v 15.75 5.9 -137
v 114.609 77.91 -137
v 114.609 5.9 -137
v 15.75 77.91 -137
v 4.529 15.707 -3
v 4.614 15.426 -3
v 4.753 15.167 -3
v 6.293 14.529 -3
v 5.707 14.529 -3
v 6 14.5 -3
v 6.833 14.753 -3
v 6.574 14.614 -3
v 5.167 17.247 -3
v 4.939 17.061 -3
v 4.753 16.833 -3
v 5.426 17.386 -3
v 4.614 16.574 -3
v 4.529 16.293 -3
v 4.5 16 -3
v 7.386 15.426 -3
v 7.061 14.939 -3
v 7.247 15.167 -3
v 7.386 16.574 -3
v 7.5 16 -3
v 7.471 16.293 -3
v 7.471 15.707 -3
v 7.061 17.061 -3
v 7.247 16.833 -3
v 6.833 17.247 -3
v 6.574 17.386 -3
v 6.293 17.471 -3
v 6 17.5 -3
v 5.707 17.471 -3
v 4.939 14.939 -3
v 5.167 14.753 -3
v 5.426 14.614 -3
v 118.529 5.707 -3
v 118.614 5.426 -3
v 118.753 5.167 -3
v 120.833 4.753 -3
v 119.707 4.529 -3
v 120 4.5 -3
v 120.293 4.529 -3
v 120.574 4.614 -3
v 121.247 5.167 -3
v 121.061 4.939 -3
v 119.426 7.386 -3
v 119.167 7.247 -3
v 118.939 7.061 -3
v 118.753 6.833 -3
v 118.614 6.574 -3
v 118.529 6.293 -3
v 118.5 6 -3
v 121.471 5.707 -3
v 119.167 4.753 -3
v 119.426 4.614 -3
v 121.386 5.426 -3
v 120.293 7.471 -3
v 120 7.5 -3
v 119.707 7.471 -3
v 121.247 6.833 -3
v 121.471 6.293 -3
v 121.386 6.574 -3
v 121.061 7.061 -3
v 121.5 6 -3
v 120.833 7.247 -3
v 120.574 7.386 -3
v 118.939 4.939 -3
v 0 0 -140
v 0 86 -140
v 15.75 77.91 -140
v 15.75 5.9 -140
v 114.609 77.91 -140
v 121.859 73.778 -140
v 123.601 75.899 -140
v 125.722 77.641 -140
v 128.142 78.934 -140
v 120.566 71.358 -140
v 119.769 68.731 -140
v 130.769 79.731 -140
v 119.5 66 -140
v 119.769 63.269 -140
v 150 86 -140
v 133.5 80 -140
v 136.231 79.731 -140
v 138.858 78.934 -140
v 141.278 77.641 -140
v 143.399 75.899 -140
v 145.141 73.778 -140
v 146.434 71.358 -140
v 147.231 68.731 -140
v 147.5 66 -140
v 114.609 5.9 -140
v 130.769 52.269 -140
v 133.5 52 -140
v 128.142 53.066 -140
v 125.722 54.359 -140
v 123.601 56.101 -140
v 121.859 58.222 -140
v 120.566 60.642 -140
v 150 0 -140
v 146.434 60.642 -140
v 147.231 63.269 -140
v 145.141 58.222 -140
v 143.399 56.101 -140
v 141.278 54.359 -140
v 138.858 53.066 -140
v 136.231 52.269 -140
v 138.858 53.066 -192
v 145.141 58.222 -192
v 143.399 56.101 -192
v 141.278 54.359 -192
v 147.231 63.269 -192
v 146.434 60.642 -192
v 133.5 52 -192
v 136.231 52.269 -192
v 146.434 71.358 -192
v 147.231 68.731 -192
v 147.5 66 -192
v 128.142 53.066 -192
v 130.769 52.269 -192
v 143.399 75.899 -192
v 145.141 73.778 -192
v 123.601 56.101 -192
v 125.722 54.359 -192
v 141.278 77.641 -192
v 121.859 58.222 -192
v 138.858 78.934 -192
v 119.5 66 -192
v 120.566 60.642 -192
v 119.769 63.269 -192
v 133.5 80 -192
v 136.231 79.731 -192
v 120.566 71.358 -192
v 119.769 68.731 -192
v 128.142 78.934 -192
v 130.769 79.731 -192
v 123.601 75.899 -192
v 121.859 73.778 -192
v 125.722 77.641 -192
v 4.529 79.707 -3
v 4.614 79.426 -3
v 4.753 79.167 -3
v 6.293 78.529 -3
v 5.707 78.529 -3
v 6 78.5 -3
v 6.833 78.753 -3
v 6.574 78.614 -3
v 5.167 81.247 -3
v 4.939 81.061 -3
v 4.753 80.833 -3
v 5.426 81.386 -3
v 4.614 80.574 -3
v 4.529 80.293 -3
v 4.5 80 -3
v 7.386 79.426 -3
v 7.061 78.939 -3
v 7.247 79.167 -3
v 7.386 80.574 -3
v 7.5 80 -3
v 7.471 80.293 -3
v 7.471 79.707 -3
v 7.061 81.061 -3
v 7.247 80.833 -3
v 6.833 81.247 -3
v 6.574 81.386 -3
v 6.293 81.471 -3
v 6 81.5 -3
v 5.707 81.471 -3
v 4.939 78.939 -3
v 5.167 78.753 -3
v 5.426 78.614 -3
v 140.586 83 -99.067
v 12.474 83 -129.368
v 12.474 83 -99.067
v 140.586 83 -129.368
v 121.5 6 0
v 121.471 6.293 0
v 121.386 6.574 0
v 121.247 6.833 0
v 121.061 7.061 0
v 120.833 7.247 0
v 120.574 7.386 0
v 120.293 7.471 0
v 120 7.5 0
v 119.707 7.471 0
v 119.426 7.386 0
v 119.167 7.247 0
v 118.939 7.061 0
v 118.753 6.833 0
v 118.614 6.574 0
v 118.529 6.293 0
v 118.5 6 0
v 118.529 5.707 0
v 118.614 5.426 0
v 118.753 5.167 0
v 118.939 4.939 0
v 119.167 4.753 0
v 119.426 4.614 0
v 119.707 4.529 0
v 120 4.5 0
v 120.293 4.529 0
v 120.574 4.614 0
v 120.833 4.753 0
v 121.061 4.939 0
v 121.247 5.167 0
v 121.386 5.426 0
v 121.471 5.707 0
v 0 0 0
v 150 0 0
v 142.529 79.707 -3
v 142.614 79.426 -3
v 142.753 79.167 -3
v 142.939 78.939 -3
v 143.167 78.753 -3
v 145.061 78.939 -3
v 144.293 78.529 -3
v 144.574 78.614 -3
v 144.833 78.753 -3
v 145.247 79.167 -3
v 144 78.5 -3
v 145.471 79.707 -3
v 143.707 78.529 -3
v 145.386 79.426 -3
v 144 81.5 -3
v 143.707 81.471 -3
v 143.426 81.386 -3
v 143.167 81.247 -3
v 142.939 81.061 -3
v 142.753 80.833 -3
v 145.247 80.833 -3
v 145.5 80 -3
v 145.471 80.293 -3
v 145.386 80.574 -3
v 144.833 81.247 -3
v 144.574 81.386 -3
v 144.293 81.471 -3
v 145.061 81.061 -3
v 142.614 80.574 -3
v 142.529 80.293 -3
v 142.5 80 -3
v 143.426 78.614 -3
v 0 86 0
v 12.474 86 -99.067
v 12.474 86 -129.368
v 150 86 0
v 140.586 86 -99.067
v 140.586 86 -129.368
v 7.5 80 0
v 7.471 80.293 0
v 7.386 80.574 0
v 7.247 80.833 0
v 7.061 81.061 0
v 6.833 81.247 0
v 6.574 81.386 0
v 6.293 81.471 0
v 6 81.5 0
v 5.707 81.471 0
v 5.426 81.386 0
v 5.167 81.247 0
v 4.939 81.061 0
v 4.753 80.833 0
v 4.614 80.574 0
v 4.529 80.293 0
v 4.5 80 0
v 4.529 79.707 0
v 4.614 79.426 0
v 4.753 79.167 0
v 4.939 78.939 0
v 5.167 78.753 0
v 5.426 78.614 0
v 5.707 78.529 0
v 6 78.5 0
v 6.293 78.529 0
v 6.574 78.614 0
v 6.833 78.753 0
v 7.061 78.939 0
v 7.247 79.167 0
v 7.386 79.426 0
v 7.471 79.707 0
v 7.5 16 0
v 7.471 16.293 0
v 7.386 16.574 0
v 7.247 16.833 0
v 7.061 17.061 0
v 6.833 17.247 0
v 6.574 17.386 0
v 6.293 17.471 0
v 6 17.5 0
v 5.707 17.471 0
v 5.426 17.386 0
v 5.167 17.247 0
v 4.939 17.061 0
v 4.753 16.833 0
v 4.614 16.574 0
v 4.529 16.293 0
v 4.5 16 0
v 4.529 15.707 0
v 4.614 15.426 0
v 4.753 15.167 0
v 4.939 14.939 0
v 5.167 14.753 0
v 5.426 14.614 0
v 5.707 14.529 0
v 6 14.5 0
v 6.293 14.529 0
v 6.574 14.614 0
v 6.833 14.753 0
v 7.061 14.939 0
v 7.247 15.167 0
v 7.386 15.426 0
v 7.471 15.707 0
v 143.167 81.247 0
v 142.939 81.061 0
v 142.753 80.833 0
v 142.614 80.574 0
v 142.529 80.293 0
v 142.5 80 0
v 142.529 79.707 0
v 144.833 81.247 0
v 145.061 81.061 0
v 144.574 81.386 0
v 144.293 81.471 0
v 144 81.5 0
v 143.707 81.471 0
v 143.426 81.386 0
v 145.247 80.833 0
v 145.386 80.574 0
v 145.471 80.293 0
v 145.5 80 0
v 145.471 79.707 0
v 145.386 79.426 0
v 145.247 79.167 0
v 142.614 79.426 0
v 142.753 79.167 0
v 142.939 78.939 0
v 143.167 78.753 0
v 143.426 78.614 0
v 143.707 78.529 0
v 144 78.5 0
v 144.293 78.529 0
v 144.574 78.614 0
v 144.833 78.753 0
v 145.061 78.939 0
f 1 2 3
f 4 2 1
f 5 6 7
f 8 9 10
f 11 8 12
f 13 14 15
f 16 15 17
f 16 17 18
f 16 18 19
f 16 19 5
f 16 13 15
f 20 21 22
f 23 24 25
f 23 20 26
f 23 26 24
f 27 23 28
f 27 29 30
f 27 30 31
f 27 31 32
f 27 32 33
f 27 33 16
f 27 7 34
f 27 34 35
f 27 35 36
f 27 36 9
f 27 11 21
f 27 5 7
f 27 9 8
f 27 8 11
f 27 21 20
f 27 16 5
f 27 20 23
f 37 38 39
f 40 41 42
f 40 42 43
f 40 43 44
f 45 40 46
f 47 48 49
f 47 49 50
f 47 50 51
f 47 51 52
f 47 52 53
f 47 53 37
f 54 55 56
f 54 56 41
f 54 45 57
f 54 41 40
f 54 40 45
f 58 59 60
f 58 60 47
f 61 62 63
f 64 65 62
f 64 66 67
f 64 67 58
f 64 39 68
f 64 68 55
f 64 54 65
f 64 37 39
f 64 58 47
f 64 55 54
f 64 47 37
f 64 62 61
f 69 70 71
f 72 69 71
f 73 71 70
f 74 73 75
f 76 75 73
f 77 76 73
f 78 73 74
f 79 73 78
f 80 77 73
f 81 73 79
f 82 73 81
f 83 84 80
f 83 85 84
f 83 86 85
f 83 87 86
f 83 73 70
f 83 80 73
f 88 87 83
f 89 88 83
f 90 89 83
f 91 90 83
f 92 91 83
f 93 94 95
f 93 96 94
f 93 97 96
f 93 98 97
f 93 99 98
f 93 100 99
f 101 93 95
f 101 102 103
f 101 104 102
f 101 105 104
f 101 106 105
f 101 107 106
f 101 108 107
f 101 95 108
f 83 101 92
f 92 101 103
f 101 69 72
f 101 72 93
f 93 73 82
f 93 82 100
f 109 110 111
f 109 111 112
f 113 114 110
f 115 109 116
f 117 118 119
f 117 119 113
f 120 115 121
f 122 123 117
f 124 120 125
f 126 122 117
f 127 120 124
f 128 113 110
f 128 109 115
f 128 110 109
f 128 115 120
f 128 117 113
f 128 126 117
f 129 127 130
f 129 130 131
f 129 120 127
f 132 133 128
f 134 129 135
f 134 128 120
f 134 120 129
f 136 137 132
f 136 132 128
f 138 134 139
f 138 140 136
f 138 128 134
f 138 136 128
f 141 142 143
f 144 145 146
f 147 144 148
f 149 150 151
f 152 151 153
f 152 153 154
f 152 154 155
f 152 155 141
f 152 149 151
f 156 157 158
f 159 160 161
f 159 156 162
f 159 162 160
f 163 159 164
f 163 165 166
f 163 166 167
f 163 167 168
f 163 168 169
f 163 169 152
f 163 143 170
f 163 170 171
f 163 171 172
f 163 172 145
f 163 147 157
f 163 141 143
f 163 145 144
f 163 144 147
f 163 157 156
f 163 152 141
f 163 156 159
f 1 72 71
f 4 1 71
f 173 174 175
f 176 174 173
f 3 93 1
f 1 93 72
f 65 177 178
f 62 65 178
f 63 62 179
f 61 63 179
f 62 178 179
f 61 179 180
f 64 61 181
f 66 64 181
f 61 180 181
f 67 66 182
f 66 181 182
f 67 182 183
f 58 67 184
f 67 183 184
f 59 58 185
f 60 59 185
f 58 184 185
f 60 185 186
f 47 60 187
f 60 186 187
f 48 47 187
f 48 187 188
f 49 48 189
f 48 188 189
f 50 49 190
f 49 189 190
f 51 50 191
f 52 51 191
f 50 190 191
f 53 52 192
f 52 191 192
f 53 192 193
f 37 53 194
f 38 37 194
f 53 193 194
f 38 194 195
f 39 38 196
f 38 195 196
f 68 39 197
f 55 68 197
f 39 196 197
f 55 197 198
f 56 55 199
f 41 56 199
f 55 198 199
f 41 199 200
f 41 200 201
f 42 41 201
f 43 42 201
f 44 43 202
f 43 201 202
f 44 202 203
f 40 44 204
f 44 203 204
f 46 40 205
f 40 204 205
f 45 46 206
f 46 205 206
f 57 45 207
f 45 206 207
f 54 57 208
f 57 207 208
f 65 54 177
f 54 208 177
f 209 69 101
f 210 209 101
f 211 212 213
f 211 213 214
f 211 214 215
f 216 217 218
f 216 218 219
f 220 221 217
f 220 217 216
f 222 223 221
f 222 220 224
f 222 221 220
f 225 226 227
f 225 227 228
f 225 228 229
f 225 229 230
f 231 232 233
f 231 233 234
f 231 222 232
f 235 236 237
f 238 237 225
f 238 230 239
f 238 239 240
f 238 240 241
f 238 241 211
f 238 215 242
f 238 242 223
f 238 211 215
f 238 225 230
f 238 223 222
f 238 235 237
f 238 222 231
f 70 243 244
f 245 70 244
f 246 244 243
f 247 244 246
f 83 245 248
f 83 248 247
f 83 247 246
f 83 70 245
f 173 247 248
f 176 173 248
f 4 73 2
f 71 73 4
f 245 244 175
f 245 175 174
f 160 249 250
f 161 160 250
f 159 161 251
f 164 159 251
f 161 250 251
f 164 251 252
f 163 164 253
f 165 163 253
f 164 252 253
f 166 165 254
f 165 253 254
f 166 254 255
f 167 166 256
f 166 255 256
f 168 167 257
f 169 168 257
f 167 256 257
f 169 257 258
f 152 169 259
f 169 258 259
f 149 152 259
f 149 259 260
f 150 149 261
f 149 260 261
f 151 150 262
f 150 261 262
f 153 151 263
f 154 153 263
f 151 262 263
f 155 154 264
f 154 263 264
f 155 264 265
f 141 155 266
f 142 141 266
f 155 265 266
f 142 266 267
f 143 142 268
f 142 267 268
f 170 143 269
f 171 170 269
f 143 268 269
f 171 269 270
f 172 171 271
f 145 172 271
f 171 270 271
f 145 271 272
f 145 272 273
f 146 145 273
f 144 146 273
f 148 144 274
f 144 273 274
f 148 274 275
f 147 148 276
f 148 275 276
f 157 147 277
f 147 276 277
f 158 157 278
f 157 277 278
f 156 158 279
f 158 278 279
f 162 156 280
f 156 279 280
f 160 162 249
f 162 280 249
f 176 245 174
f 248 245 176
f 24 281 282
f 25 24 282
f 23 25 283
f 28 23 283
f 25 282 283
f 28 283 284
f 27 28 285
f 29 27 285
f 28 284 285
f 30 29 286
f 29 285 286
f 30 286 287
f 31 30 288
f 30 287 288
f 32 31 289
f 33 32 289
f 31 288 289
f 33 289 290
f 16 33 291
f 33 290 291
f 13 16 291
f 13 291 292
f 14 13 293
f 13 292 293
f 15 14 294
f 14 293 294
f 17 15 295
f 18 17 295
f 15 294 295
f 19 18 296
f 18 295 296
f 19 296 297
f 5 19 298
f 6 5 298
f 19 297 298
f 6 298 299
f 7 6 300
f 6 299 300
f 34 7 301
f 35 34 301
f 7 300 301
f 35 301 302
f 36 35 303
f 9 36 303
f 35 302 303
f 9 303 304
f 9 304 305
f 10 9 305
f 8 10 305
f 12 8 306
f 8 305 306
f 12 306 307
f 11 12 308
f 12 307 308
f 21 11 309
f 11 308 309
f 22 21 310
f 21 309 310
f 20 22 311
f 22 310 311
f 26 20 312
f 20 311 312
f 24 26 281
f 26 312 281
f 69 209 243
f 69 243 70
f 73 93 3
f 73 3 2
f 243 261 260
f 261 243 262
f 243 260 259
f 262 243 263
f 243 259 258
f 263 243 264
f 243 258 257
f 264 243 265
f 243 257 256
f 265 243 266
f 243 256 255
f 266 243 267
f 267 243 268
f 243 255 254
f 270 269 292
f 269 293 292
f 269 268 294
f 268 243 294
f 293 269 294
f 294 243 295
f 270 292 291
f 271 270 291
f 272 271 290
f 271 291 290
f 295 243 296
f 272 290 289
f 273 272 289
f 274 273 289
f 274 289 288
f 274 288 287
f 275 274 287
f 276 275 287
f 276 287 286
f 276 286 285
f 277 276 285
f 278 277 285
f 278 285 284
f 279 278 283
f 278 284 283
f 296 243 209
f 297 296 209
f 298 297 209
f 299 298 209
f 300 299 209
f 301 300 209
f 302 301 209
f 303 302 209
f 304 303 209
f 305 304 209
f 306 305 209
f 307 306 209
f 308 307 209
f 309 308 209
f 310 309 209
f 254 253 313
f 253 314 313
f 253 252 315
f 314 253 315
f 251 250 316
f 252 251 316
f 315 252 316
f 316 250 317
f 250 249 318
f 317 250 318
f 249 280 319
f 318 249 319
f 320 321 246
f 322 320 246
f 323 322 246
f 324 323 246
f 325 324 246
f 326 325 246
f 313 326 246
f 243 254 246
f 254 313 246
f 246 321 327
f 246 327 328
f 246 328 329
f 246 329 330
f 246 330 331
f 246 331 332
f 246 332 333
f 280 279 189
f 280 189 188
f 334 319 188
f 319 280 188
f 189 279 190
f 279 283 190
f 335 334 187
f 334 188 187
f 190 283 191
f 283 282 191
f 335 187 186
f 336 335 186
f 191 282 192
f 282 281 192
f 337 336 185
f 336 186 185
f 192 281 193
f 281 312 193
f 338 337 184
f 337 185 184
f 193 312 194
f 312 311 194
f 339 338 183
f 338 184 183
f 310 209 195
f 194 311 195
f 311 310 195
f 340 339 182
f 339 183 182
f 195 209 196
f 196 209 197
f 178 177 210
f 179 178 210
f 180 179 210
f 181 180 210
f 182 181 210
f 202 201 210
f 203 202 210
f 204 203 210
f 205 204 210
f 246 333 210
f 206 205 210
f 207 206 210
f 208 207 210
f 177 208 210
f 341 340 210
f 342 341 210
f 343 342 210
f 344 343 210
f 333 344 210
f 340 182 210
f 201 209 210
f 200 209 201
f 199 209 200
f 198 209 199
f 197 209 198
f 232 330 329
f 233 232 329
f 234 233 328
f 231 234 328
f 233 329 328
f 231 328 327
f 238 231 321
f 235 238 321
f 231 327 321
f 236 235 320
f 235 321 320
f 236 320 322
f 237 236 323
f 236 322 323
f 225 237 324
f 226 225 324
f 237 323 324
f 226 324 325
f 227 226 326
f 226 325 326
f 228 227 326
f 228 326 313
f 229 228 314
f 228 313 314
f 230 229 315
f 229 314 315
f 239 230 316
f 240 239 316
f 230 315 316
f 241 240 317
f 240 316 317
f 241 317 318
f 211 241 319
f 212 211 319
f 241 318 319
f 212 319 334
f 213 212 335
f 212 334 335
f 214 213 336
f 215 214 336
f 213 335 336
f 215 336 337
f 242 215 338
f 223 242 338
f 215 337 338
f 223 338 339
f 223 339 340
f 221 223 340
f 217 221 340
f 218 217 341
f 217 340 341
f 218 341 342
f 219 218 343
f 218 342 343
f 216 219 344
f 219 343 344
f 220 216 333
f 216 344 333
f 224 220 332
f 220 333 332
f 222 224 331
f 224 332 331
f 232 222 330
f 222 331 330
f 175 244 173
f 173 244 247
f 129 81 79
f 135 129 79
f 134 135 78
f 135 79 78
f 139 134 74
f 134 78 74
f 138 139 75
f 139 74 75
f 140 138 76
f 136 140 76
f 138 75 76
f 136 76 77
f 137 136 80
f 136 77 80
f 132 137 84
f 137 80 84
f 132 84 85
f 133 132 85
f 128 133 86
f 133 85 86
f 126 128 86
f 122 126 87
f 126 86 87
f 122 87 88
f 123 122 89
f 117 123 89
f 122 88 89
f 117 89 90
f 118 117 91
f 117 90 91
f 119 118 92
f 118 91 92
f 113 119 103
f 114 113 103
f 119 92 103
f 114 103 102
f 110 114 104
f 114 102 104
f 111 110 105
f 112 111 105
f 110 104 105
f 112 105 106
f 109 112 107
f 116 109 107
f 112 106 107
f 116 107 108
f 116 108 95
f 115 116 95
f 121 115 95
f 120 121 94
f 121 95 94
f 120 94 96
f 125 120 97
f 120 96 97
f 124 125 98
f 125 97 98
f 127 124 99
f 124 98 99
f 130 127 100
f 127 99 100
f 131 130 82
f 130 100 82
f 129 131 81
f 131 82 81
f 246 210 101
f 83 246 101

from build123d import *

# Parameters (mm, degrees)
SKETCH1_W           = 150
SKETCH1_H           = 140
BOSS_EXTRUDE1_DEPTH = 86
SKETCH2_R           = 1.5
CUT_EXTRUDE1_DEPTH  = 3
BOTTOM_VENT_W       = 128.112390575
BOTTOM_VENT_H       = 30.300850467
CUT_EXTRUDE2_DEPTH  = 3
SKETCH4_R           = 14
BOSS_EXTRUDE2_DEPTH = 52
SKETCH5_W           = 98.859747303
SKETCH5_H           = 72.009781986
CUT_EXTRUDE3_DEPTH  = 3


with BuildPart() as part:
    # Sketch1 → Boss-Extrude1 (new body)
    with BuildSketch(Plane(origin=(0, 0, 0), x_dir=(1, 0, 0), z_dir=(0, 1, 0))):
        with Locations((75, 70)):
            Rectangle(SKETCH1_W, SKETCH1_H)
    extrude(amount=BOSS_EXTRUDE1_DEPTH)

    # Sketch2 → Cut-Extrude1 (cut)
    with BuildSketch(Plane.XY):
        with Locations((6, 80)):
            Circle(SKETCH2_R)
        with Locations((6, 16)):
            Circle(SKETCH2_R)
        with Locations((120, 6)):
            Circle(SKETCH2_R)
        with Locations((144, 80)):
            Circle(SKETCH2_R)
    extrude(amount=-CUT_EXTRUDE1_DEPTH, mode=Mode.SUBTRACT)

    # bottom vent → Cut-Extrude2 (cut)
    with BuildSketch(Plane(origin=(0, 86, 0), x_dir=(1, 0, 0), z_dir=(0, 1, 0))):
        with Locations((76.529847499, 114.217527718)):
            Rectangle(BOTTOM_VENT_W, BOTTOM_VENT_H)
    extrude(amount=-CUT_EXTRUDE2_DEPTH, mode=Mode.SUBTRACT)

    # Sketch4 → Boss-Extrude2 (add)
    with BuildSketch(Plane(origin=(0, 0, -140), x_dir=(-1, 0, 0), z_dir=(0, 0, -1))):
        with Locations((-133.5, 66)):
            Circle(SKETCH4_R)
    extrude(amount=BOSS_EXTRUDE2_DEPTH)

    # Sketch5 → Cut-Extrude3 (cut)
    with BuildSketch(Plane(origin=(0, 0, -140), x_dir=(-1, 0, 0), z_dir=(0, 0, -1))):
        with Locations((-65.179614688, 41.905186472)):
            Rectangle(SKETCH5_W, SKETCH5_H)
    extrude(amount=-CUT_EXTRUDE3_DEPTH, mode=Mode.SUBTRACT)


solid = part.part
